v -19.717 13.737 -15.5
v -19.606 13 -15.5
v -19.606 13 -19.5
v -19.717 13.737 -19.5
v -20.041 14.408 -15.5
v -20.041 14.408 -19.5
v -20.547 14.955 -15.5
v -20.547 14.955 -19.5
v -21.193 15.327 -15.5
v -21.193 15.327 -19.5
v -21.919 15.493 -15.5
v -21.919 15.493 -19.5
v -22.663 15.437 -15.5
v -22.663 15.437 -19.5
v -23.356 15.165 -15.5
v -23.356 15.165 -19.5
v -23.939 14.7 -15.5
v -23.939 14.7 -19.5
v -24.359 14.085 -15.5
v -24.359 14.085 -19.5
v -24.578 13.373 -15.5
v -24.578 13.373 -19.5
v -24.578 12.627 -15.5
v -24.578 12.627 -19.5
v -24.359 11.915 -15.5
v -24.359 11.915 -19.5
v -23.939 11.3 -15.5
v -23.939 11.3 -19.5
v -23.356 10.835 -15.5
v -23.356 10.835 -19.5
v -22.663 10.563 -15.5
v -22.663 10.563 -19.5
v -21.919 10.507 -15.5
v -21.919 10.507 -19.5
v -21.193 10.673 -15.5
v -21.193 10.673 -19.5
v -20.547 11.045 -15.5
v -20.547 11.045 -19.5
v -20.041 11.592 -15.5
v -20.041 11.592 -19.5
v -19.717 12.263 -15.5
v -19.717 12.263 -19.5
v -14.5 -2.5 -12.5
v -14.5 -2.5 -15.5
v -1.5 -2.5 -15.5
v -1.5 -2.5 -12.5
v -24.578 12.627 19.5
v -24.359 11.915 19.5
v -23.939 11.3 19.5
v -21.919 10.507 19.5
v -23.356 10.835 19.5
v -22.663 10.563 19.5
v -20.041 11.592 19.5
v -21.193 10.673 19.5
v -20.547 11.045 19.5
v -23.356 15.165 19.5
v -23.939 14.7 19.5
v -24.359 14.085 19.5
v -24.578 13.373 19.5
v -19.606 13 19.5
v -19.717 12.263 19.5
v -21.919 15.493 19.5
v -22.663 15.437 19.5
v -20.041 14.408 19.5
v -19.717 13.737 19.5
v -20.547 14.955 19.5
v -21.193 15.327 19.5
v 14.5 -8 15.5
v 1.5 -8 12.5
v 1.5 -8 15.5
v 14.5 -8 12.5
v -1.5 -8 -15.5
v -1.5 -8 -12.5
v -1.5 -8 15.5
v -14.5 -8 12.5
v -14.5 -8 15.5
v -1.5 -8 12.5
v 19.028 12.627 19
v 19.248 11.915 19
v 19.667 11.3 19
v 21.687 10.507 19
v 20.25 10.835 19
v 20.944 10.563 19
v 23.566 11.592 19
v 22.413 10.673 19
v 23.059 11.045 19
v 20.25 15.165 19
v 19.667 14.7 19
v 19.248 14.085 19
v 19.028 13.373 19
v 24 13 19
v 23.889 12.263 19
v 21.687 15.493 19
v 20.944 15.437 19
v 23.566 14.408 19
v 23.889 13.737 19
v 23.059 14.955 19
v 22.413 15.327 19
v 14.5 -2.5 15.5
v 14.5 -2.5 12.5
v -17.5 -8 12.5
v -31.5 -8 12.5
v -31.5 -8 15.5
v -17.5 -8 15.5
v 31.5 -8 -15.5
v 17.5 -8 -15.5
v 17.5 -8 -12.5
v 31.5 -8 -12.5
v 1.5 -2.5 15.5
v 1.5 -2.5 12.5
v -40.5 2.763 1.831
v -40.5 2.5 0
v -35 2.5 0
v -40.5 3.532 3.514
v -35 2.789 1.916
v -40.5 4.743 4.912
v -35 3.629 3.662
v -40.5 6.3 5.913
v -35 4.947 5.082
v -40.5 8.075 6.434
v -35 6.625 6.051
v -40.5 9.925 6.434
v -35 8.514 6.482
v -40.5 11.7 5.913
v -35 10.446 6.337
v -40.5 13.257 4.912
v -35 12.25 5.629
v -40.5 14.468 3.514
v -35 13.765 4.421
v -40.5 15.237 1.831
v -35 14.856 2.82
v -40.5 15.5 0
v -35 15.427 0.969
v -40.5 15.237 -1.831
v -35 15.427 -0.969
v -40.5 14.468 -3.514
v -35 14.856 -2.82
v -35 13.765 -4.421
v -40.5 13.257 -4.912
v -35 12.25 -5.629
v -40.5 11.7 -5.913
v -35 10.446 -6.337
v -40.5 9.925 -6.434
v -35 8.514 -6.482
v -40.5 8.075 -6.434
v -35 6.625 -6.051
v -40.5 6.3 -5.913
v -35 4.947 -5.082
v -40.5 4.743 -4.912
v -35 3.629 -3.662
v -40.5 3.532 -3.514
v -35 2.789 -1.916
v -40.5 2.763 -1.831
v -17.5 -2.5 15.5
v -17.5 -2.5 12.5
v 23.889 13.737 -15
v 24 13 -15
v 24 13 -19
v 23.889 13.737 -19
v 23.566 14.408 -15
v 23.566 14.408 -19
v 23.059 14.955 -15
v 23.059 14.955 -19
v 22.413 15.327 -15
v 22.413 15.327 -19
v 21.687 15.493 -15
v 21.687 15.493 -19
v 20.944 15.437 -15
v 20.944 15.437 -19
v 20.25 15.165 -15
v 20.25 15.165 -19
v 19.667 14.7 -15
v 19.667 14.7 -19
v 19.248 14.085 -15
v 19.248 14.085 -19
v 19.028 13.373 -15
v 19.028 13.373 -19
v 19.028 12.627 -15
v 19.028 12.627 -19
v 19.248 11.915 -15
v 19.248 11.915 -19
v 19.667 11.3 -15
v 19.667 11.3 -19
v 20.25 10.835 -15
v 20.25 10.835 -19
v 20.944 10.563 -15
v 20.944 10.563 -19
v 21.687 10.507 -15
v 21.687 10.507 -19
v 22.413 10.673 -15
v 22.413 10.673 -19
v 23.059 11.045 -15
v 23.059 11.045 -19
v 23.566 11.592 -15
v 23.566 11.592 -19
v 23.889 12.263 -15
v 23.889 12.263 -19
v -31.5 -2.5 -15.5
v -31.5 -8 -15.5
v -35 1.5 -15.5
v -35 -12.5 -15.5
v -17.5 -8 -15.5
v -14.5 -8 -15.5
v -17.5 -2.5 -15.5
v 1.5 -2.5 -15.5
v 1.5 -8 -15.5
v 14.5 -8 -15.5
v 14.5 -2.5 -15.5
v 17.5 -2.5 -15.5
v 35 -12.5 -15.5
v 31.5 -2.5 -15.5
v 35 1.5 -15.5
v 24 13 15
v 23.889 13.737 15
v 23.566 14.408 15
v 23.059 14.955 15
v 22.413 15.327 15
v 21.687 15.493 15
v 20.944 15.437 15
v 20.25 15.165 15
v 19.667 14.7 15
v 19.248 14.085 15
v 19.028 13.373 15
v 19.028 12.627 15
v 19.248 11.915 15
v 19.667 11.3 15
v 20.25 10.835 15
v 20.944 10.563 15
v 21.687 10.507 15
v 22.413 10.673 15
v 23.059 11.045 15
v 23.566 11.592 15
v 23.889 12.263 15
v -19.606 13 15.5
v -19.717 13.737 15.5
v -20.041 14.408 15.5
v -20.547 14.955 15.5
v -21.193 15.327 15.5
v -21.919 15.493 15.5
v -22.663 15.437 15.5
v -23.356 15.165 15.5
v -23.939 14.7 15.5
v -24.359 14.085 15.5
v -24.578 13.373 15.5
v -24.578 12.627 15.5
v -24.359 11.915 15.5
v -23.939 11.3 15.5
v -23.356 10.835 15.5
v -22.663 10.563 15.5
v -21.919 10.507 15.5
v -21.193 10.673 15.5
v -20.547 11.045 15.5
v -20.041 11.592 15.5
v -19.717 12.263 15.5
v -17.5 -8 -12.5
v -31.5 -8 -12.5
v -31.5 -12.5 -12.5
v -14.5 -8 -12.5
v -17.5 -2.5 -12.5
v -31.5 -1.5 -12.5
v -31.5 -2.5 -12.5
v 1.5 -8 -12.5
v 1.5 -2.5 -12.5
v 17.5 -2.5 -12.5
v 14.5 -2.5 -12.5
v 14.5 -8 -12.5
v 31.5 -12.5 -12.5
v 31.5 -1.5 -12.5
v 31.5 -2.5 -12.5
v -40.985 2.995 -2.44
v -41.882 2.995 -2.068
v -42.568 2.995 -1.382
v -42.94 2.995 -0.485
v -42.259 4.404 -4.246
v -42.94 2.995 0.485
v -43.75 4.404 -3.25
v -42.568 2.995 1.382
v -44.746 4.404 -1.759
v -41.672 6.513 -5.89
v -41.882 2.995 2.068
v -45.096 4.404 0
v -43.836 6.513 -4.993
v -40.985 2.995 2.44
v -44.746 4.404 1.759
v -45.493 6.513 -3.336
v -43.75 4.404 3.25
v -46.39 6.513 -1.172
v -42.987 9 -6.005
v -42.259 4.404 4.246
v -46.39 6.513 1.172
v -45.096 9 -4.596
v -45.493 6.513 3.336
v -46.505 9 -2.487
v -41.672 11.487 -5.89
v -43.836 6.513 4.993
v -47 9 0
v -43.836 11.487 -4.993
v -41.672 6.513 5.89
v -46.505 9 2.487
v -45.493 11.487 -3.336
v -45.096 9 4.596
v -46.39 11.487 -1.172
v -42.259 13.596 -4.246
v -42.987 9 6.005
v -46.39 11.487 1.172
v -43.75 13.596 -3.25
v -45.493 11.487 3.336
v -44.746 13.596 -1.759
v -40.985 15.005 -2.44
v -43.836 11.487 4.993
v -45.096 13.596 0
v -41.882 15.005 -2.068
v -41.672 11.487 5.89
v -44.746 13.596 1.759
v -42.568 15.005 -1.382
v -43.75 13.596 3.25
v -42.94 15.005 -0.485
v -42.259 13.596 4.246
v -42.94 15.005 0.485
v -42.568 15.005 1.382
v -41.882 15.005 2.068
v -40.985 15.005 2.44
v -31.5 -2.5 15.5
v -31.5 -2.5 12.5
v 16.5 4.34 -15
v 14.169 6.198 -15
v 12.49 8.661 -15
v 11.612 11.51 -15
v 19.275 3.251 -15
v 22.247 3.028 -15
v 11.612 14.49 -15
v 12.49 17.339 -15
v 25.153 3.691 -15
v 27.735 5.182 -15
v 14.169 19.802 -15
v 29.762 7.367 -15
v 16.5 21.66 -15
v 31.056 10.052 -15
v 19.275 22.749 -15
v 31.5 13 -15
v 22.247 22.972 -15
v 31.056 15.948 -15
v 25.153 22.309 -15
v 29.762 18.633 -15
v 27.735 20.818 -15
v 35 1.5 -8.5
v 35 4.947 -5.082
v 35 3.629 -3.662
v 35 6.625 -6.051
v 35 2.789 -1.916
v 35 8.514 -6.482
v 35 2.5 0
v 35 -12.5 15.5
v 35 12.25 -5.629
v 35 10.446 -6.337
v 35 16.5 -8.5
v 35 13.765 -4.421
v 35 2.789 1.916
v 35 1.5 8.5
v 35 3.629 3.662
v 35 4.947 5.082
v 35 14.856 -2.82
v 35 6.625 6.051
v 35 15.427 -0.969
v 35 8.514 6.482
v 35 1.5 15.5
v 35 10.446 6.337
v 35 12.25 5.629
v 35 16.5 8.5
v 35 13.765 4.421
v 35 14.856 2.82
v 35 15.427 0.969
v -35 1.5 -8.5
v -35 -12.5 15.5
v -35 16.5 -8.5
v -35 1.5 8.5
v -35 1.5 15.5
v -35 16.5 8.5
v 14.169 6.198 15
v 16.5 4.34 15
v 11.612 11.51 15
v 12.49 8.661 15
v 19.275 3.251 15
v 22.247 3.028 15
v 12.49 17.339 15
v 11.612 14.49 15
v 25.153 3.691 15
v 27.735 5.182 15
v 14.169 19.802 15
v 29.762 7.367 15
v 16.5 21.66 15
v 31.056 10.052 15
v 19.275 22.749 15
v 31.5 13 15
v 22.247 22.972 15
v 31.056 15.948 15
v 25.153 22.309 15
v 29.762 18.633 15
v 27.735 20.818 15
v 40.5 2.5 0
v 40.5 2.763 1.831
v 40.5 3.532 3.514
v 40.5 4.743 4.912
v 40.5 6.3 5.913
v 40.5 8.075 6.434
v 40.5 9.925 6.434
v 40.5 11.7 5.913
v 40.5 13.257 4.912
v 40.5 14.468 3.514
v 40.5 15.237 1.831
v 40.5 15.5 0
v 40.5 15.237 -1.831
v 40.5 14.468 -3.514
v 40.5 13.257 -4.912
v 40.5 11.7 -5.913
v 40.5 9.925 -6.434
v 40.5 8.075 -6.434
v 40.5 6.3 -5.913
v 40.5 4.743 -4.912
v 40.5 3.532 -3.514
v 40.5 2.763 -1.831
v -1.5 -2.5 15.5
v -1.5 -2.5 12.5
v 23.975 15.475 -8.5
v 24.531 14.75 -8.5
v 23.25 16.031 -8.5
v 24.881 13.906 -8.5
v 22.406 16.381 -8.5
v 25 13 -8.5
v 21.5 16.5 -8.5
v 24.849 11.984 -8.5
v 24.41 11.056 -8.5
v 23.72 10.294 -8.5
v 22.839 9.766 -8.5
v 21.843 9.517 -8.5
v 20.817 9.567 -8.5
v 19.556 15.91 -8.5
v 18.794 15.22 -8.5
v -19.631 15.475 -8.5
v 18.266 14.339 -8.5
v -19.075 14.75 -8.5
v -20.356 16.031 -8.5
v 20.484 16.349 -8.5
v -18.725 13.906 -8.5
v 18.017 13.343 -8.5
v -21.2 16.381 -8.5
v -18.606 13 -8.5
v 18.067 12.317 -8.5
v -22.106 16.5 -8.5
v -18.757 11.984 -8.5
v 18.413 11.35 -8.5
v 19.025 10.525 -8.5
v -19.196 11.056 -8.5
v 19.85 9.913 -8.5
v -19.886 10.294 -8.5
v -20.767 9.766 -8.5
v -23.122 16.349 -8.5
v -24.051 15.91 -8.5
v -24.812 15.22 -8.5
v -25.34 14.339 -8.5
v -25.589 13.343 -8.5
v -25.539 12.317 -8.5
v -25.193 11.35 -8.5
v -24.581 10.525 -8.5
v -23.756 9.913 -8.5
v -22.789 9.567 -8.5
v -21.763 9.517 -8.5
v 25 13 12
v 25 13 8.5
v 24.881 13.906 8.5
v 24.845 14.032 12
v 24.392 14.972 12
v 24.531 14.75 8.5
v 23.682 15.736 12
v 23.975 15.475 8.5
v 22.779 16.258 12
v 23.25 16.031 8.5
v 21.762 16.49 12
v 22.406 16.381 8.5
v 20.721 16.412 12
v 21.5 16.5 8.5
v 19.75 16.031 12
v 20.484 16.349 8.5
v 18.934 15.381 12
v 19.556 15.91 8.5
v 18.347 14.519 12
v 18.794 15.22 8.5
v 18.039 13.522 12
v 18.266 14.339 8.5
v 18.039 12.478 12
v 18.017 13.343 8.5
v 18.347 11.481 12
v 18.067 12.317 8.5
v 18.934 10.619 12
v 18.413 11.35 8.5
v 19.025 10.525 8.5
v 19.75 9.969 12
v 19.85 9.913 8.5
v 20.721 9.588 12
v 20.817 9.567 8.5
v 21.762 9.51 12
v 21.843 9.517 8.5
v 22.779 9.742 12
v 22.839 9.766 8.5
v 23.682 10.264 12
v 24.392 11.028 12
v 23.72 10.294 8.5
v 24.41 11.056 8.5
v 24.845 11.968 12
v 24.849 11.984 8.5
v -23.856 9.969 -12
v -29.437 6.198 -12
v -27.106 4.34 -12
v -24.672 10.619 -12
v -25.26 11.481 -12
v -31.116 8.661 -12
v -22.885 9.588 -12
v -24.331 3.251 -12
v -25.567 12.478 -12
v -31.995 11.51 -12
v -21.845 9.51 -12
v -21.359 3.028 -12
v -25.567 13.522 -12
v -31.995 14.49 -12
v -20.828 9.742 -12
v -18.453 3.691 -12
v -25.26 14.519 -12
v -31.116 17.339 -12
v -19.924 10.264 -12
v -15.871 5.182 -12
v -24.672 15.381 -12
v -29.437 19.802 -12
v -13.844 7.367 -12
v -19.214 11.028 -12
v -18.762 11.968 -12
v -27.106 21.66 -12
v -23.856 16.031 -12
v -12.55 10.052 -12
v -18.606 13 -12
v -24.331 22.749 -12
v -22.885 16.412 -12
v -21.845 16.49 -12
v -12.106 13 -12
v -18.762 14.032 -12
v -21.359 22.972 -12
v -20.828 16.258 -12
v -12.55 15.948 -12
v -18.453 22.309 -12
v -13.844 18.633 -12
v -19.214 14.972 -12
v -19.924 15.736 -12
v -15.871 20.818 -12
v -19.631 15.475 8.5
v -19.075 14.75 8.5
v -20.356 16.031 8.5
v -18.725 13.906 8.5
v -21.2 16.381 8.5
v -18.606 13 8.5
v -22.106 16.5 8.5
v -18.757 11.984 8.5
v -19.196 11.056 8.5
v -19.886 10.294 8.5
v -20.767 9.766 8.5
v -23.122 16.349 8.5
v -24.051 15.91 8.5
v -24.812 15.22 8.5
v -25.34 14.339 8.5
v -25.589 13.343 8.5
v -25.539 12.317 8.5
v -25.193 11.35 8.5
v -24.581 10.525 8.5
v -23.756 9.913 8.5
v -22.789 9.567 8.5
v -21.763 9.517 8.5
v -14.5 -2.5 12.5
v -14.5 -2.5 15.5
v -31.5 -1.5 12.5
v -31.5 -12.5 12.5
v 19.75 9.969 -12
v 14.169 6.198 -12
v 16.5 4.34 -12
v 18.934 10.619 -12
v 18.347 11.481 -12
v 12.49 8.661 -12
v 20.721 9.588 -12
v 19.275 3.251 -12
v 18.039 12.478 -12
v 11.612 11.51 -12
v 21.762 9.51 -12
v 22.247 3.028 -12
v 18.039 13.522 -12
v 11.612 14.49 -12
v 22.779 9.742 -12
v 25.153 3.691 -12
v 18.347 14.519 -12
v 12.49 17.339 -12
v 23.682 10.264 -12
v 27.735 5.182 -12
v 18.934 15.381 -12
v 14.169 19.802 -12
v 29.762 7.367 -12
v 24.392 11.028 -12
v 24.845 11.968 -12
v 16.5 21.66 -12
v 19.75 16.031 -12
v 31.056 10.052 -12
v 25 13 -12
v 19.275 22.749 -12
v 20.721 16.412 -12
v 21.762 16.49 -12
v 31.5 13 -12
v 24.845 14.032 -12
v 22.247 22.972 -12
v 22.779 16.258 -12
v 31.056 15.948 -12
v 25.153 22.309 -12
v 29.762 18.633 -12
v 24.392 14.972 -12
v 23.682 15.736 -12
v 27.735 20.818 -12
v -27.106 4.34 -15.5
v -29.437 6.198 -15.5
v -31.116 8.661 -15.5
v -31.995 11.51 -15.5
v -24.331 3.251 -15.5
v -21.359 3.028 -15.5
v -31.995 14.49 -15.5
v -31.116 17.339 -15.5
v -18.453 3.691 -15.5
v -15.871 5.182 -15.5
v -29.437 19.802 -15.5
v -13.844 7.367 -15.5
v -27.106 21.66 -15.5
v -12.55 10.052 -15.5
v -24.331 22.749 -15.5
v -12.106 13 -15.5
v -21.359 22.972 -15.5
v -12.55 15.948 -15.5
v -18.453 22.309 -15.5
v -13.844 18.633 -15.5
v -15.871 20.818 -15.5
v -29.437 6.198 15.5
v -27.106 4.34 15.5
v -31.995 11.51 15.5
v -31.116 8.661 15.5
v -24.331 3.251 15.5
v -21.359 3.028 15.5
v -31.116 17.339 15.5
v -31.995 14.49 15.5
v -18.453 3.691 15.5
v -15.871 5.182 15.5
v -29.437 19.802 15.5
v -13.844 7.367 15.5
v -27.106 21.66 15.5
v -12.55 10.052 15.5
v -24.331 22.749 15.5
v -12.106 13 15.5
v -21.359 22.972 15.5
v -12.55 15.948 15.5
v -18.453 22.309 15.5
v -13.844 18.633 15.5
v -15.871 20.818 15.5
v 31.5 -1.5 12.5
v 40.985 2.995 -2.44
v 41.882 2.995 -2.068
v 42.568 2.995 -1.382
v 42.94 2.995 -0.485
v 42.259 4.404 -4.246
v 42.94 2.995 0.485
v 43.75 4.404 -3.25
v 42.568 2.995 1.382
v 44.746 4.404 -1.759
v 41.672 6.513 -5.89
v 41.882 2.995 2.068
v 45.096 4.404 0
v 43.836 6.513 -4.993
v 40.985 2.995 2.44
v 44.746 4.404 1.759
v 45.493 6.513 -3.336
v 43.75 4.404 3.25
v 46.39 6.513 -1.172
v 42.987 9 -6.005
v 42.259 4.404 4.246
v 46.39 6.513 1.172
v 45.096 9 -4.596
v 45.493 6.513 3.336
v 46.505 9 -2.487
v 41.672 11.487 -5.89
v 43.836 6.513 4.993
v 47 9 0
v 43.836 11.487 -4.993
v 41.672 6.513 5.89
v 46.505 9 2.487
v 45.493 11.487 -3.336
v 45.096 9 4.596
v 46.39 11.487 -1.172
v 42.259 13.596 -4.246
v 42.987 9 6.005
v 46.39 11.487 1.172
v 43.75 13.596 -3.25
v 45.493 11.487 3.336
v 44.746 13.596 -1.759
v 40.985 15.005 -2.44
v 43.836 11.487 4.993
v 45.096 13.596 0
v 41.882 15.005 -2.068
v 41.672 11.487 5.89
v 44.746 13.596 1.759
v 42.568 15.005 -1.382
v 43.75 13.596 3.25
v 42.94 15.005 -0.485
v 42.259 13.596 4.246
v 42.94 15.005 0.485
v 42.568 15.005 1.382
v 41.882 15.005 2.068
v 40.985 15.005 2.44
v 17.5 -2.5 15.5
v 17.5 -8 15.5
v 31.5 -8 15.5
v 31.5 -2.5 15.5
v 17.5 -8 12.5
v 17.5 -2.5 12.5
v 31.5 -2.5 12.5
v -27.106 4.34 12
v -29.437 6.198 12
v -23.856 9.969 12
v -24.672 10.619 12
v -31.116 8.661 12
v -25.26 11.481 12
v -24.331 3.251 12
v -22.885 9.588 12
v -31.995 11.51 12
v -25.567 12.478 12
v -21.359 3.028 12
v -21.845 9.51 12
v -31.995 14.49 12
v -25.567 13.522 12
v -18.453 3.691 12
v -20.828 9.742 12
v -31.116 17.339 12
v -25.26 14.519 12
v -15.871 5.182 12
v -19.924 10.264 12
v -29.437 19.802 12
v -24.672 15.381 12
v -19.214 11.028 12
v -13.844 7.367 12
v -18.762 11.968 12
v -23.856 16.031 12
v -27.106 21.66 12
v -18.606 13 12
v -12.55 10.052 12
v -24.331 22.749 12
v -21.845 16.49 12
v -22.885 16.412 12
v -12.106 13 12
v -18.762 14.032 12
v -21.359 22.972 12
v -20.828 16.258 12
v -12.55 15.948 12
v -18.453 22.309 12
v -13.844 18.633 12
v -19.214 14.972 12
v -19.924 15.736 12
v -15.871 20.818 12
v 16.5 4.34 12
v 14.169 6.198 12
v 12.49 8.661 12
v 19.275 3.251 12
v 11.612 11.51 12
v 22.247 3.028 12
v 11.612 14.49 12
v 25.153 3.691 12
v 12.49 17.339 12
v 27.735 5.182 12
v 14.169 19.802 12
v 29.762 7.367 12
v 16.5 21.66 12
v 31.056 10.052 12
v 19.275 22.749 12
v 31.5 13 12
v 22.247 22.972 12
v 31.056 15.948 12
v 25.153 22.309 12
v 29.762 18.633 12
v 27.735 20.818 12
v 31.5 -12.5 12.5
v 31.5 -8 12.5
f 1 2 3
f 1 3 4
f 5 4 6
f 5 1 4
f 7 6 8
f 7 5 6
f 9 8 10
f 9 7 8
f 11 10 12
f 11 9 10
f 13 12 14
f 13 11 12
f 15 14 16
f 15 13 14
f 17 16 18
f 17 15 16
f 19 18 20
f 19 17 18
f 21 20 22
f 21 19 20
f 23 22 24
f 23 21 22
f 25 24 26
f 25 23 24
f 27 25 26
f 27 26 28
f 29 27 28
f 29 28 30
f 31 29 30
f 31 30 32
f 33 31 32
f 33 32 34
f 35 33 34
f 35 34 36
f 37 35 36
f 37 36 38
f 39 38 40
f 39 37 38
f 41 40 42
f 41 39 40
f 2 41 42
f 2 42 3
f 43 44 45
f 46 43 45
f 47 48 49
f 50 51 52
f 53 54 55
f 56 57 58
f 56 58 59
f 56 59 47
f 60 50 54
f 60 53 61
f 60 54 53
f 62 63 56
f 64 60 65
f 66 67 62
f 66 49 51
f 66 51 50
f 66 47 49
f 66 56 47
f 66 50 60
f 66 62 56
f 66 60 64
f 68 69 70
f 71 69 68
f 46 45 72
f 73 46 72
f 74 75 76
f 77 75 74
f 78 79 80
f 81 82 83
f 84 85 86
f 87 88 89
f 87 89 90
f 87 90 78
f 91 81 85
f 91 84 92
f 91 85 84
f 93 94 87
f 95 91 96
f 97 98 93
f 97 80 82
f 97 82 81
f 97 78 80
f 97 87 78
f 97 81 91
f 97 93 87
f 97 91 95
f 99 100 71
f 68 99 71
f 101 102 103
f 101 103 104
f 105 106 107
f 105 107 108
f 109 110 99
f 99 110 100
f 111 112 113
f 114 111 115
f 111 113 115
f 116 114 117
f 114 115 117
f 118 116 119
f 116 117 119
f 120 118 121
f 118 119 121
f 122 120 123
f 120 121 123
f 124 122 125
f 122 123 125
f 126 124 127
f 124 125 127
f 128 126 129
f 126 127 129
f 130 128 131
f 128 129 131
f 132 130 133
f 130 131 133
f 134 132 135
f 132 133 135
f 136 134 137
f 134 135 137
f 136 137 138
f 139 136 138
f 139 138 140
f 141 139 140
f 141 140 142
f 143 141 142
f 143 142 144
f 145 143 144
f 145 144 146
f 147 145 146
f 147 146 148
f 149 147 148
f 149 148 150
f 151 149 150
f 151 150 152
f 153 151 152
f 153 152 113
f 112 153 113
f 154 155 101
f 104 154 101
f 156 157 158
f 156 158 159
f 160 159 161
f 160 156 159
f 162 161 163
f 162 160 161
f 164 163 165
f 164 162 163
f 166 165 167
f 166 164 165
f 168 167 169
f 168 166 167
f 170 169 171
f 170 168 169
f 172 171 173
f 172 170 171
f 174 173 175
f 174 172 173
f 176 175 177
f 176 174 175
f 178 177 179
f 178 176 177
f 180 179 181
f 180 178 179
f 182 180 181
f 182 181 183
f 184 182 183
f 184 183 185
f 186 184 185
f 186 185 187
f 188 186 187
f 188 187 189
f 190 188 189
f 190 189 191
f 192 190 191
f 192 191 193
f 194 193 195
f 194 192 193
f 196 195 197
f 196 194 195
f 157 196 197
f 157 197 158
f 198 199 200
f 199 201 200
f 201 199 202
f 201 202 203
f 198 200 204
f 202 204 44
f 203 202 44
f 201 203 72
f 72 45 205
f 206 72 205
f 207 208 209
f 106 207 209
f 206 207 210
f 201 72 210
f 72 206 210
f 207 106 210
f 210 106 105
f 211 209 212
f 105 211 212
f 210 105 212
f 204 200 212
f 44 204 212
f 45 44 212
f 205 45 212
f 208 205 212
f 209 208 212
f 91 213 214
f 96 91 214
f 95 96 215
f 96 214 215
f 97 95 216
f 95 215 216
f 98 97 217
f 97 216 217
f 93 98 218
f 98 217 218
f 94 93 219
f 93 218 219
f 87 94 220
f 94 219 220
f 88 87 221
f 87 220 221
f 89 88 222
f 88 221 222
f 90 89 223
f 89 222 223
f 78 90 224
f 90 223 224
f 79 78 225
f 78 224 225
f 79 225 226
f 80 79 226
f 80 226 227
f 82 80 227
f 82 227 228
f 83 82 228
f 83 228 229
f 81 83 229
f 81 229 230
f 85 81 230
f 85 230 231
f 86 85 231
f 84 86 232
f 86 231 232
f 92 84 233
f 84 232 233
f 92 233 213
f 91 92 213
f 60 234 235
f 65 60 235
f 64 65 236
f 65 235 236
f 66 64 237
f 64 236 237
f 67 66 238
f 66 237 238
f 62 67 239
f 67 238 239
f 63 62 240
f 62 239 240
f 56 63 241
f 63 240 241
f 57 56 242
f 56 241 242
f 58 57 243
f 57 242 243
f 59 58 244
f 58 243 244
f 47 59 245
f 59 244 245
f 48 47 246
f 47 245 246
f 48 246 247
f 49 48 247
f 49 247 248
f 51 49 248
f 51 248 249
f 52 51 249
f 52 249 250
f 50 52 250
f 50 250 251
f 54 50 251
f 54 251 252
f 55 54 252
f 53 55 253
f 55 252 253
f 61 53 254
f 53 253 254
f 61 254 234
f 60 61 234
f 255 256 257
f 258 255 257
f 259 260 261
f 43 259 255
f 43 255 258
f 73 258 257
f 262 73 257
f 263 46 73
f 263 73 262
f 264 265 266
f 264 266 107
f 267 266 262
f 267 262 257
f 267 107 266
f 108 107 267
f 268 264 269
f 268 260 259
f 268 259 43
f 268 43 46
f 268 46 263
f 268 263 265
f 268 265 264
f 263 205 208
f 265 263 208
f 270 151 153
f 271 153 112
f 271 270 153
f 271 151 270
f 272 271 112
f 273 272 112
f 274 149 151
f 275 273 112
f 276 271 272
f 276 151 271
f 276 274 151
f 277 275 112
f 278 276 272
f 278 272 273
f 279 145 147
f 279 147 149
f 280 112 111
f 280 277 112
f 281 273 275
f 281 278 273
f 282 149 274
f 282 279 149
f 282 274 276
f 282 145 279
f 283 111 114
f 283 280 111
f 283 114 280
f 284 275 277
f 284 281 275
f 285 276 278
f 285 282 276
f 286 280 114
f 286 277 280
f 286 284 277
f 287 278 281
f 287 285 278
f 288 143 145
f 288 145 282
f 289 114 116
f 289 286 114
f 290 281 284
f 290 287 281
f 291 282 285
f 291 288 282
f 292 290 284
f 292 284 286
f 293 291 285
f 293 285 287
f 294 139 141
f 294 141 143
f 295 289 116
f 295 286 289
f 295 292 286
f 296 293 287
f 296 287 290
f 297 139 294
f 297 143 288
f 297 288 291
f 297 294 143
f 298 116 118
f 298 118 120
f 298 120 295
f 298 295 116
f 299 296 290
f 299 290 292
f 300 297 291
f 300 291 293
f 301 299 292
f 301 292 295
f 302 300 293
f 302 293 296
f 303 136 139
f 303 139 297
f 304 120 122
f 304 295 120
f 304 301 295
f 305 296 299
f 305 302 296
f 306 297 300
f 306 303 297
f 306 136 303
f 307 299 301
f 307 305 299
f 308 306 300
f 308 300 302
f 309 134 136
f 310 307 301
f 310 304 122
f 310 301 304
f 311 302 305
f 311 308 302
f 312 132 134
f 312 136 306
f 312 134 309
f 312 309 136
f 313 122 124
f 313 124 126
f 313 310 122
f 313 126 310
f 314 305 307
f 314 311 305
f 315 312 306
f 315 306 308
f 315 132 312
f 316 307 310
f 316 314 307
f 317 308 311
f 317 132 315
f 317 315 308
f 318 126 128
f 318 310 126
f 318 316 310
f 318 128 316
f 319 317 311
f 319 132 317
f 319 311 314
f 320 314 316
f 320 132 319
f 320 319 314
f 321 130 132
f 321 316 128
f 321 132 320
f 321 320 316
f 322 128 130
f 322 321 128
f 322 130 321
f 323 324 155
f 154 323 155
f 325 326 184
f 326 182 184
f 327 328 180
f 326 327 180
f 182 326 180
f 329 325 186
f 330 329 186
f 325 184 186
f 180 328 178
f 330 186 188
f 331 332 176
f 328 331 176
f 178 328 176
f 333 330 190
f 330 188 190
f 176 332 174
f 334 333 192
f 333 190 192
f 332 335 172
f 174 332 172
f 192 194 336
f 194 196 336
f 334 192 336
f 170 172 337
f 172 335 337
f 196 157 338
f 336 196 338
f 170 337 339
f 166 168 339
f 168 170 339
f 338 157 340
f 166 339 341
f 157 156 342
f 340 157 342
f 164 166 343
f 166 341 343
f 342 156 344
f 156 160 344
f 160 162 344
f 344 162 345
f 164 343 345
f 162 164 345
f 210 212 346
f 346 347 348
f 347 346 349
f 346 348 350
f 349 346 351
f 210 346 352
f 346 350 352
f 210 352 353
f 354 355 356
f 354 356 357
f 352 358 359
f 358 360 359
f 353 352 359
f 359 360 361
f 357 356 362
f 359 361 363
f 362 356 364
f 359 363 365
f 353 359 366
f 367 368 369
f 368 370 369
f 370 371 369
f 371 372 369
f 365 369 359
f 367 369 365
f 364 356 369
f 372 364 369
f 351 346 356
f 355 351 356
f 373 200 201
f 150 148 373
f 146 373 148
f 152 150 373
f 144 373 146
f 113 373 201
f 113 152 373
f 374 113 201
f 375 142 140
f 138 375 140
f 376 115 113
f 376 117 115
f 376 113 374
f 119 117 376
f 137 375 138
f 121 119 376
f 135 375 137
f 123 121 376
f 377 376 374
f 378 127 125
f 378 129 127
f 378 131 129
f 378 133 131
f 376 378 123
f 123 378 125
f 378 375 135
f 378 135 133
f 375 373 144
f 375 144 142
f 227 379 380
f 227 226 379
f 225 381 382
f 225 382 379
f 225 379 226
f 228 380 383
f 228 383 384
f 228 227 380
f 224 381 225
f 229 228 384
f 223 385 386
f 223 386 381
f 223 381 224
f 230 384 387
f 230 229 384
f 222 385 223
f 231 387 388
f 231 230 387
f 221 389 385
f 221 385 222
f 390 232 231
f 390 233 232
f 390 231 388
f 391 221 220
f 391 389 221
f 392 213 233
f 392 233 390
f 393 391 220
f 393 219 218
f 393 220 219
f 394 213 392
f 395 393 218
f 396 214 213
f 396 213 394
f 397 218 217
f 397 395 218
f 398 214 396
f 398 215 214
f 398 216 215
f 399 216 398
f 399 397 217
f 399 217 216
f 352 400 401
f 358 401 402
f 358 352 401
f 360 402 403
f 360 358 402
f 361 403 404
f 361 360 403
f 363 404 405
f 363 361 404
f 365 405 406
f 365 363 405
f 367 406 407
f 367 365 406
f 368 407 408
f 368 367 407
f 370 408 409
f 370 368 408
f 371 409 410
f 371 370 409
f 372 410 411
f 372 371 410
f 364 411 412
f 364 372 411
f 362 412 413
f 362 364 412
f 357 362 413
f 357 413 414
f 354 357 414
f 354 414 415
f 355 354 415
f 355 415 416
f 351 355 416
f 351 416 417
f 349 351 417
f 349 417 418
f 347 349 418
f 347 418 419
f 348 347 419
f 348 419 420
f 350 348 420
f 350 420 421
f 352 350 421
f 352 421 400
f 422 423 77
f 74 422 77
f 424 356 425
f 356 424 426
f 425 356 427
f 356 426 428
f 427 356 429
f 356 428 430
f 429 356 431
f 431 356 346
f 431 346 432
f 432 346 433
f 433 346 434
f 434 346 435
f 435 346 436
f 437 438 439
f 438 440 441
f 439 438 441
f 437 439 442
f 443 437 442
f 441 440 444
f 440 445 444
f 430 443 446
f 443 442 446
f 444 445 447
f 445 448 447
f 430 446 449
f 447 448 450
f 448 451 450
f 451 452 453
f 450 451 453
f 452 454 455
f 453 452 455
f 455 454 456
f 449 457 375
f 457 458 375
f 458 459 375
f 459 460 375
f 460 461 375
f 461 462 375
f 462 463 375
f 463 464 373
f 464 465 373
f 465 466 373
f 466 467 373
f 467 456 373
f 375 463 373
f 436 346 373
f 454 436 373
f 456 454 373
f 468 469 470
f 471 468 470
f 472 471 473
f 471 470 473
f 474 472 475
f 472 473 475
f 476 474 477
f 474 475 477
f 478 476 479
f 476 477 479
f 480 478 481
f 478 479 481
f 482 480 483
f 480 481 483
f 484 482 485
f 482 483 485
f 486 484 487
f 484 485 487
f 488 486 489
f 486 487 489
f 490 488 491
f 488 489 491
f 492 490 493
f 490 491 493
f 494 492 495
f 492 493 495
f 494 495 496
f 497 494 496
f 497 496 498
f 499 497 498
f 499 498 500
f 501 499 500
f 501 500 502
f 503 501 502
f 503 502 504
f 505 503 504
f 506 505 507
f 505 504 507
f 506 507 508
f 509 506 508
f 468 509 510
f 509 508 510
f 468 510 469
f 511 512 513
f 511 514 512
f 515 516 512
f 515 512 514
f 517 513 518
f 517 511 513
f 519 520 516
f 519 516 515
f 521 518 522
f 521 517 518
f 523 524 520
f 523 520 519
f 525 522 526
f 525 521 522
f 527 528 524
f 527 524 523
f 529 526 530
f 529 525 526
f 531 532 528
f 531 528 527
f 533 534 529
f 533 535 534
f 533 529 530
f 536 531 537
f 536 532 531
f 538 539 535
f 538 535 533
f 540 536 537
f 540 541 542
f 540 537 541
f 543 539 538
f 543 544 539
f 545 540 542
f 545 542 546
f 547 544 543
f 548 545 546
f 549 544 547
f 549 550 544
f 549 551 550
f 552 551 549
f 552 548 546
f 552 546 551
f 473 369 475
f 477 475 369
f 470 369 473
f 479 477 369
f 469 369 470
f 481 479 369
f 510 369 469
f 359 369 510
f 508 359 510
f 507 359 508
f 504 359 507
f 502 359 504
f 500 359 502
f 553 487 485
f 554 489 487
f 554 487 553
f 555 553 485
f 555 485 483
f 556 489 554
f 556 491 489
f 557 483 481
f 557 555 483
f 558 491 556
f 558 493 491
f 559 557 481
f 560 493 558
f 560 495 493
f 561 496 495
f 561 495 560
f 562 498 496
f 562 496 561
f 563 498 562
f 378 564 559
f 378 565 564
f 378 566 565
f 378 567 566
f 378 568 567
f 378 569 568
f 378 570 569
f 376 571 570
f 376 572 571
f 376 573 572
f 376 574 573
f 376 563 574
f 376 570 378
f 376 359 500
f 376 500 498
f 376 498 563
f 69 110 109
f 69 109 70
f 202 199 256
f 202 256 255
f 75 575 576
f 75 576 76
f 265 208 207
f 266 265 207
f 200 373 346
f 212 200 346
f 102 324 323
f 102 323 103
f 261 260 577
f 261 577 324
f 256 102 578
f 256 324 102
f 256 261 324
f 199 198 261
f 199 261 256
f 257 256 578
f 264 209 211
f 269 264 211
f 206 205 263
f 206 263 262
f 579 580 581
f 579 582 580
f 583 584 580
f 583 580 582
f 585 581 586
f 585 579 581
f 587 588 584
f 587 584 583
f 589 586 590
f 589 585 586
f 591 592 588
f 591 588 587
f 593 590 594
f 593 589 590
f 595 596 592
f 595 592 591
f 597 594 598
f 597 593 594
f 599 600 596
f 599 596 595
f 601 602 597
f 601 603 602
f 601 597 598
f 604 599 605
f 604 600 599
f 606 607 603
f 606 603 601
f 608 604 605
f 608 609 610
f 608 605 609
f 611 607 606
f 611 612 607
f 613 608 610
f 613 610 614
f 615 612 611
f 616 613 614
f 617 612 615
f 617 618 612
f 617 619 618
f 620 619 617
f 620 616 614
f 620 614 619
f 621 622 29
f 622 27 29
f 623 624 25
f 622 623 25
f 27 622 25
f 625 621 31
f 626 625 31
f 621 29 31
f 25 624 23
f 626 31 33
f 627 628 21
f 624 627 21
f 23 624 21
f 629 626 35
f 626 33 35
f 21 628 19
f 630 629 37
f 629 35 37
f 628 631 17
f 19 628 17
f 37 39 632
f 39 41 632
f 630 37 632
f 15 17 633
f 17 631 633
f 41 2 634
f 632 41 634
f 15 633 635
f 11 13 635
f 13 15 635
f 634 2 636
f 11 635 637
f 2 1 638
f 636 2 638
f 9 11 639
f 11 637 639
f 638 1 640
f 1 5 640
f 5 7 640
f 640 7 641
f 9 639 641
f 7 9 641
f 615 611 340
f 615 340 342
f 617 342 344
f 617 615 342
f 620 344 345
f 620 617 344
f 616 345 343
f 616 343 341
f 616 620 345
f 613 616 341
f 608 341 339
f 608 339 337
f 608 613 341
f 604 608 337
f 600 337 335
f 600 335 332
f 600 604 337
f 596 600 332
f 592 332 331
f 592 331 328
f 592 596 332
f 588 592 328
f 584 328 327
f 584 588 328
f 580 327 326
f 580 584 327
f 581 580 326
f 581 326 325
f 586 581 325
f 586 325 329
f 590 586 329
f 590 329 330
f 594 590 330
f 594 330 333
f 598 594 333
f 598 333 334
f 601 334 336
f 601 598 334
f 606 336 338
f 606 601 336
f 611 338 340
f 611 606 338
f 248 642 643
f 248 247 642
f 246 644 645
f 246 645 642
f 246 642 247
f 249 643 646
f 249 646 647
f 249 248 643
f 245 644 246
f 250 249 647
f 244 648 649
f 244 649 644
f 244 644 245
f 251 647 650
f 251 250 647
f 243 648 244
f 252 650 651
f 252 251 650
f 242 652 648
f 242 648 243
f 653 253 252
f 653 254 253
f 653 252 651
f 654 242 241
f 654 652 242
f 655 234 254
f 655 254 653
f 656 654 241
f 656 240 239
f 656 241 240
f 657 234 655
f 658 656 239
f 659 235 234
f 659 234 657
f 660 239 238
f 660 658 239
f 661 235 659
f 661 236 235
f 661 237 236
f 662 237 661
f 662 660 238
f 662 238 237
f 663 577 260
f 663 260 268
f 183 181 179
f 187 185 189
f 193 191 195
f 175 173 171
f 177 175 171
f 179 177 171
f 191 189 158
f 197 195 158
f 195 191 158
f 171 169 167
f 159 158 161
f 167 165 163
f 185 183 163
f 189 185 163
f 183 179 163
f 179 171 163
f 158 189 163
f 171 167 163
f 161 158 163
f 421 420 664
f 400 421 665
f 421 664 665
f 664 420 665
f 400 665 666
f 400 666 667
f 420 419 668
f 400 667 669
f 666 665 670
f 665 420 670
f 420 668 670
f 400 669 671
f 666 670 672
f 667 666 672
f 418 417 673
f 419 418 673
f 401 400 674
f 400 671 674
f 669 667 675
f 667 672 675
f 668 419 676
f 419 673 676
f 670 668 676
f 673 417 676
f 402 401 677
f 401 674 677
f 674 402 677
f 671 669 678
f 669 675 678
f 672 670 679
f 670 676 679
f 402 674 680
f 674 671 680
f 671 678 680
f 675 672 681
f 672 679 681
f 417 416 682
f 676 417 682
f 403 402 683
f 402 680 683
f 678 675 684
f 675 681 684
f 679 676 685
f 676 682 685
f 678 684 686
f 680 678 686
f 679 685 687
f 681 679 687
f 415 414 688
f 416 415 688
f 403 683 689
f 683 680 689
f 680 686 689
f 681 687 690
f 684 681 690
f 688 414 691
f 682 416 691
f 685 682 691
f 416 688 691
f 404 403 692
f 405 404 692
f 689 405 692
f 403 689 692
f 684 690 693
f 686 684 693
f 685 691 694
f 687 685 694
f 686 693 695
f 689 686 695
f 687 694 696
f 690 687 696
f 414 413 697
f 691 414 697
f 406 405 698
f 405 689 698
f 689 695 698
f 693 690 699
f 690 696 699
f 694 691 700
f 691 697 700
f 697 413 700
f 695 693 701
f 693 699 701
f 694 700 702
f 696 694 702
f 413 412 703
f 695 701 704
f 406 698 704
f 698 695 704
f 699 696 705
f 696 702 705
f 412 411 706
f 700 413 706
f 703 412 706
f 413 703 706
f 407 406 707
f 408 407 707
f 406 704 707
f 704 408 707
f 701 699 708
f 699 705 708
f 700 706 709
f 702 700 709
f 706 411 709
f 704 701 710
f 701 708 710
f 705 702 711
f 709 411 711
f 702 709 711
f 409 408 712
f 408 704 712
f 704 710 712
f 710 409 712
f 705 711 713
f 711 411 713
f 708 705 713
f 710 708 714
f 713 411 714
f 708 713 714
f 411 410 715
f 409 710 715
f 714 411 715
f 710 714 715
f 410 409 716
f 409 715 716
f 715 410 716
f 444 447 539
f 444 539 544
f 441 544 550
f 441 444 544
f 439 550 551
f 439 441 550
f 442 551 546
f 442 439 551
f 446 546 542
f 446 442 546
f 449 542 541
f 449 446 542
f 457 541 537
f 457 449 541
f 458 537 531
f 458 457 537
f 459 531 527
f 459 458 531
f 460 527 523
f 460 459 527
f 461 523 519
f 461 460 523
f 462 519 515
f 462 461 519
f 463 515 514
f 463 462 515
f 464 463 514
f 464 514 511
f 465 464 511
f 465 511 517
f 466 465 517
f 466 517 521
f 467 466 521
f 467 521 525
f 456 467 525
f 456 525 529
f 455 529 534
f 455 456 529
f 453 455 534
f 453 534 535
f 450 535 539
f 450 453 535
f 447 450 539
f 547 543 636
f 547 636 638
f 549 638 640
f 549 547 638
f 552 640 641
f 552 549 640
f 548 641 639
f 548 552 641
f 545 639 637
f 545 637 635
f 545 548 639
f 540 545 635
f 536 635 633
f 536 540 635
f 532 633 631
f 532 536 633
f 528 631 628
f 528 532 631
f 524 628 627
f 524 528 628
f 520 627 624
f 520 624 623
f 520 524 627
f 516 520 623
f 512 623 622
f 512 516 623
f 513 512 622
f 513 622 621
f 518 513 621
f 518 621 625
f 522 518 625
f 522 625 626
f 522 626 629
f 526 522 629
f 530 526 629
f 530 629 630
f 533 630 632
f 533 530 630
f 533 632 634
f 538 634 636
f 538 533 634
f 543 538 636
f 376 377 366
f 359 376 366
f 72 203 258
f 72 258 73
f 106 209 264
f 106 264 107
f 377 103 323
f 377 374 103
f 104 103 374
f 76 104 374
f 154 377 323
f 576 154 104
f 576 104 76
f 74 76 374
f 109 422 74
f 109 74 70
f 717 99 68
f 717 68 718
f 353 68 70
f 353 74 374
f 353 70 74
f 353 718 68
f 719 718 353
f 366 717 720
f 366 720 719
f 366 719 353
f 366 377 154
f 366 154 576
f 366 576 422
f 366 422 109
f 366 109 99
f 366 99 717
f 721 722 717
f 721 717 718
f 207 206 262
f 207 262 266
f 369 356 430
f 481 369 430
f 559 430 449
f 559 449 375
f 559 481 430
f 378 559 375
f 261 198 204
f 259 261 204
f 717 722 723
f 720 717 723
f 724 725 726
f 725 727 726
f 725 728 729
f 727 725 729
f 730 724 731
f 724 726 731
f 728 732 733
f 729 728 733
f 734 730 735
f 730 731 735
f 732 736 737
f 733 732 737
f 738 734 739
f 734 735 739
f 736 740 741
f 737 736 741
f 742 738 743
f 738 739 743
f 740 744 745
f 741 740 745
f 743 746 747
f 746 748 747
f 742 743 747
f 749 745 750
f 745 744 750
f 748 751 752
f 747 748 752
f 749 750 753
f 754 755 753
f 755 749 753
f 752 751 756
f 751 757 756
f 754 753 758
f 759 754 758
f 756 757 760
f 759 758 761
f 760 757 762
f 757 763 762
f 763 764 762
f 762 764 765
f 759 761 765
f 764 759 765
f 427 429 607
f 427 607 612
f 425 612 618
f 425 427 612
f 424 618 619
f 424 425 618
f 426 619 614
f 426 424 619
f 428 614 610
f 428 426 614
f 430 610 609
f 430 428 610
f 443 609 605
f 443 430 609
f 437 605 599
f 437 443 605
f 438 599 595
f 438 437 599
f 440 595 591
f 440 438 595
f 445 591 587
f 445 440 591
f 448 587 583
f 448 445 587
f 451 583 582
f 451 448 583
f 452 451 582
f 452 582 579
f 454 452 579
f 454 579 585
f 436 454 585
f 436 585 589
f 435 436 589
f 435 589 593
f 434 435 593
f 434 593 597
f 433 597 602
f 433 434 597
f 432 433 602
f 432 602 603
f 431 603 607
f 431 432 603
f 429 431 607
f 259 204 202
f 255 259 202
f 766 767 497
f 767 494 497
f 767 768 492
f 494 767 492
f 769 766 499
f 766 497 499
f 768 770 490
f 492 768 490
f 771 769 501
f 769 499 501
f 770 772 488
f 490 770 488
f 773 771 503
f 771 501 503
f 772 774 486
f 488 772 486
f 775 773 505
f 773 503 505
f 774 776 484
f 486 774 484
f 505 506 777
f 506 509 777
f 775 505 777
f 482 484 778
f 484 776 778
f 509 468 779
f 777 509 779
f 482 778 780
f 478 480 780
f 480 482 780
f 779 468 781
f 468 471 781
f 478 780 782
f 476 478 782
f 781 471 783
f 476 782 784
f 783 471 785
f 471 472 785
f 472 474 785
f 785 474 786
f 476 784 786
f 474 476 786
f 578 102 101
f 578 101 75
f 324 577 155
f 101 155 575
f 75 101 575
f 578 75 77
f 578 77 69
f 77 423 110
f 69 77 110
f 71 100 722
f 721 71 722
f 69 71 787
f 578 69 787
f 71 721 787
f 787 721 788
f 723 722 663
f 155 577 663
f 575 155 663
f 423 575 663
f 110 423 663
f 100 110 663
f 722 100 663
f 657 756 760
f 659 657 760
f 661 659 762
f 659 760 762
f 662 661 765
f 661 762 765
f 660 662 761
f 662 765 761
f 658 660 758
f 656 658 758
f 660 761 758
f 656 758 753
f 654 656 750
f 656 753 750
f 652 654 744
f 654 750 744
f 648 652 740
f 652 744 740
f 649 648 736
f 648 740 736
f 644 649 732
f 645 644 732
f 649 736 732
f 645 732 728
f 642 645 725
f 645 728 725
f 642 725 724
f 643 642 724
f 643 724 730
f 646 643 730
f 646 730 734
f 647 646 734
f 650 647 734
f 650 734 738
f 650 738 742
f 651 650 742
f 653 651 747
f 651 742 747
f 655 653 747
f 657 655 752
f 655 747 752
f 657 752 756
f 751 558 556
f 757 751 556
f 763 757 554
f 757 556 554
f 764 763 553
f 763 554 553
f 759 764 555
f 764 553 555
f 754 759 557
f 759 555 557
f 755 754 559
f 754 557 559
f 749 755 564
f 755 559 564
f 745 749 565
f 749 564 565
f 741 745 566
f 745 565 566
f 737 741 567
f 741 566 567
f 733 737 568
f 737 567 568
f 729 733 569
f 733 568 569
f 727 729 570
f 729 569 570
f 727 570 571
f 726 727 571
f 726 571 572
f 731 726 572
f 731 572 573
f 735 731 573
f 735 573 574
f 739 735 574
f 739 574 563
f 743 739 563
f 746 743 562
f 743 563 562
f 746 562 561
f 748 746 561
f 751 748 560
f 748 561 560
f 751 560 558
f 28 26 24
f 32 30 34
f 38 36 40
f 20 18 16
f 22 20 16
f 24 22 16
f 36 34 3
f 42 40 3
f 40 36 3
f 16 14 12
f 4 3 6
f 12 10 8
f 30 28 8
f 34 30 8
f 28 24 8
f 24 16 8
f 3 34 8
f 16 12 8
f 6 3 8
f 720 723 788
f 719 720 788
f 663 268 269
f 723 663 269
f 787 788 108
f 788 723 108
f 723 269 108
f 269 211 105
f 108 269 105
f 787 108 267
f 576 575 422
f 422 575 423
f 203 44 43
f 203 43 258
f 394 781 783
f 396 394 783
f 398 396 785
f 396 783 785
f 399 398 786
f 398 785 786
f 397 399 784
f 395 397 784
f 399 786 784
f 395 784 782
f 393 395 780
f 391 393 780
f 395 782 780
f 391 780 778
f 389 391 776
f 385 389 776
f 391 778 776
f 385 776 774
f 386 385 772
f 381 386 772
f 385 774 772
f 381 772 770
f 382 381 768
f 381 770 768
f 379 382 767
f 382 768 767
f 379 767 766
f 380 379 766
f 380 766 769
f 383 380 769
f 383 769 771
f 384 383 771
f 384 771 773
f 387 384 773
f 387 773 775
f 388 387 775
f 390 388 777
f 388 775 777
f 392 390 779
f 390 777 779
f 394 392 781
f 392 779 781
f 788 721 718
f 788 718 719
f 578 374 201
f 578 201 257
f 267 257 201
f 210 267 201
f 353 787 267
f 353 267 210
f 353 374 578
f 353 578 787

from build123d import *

# Parameters (mm, degrees)
F0_W      = 70
F0_H      = 31
F1_DEPTH  = 1.5
F2_W      = 70
F2_H      = 3
F3_DEPTH  = 11
F4_W      = 70
F4_H      = 3
F5_DEPTH  = 11
F6_W      = 3.5
F6_H      = 25
F7_DEPTH  = 11
F8_W      = 3.5
F8_H      = 25
F9_DEPTH  = 11
F10_W     = 70
F10_H     = 17
F11_DEPTH = 15
F12_W     = 14
F12_H     = 5.5
F13_DEPTH = 70
F14_W     = 13
F14_H     = 5.5
F15_DEPTH = 70
F16_W     = 13
F16_H     = 5.5
F17_DEPTH = 70
F18_W     = 14
F18_H     = 5.5
F19_DEPTH = 70
F21_R     = 3.5
F22_DEPTH = 3.5
F23_R     = 3.5
F24_DEPTH = 3.5
F25_R     = 10
F26_DEPTH = 3
F27_R     = 10
F28_DEPTH = 3.5
F29_R     = 2.5
F30_DEPTH = 4
F31_R     = 2.5
F32_DEPTH = 4
F33_R     = 6.5
F34_DEPTH = 5.5


# Not quite as in the source:
# - a pattern or mirror of a feature is missing from the dataset's text; its kind, count and spacing are read off the source's solid


with BuildPart() as f1:
    # F0 (on Front) → F1 (new body, symmetric)
    with BuildSketch(Plane.XZ):
        Rectangle(F0_W, F0_H)
    extrude(amount=F1_DEPTH, both=True)

    # F2 (on face) → F3 (join)
    with BuildSketch(Plane.XZ.offset(1.5)):
        with Locations((0, -14)):
            Rectangle(F2_W, F2_H)
    extrude(amount=F3_DEPTH)

    # F4 (on face) → F5 (join)
    with BuildSketch(Plane.XZ.offset(1.5)):
        with Locations((0, 14)):
            Rectangle(F4_W, F4_H)
    extrude(amount=F5_DEPTH)

    # F6 (on face) → F7 (join)
    with BuildSketch(Plane.XZ.offset(1.5)):
        with Locations((33.25, 0)):
            Rectangle(F6_W, F6_H)
    extrude(amount=F7_DEPTH)

    # F8 (on face) → F9 (join)
    with BuildSketch(Plane.XZ.offset(1.5)):
        with Locations((-33.25, 0)):
            Rectangle(F8_W, F8_H)
    extrude(amount=F9_DEPTH)

    # F10 (on face) → F11 (join)
    with BuildSketch(Plane(origin=(0, 1.5, 0), x_dir=(-1, 0, 0), z_dir=(0, 1, 0))):
        Rectangle(F10_W, F10_H)
    extrude(amount=F11_DEPTH)

    # F12 (on face) → F13 (cut)
    with BuildSketch(Plane(origin=(0, 0, -15.5), x_dir=(1, 0, 0), z_dir=(0, 0, -1))):
        with Locations((24.5, 5.25)):
            Rectangle(F12_W, F12_H)
    extrude(amount=-F13_DEPTH, mode=Mode.SUBTRACT)

    # F14 (on face) → F15 (cut)
    with BuildSketch(Plane(origin=(0, 0, -15.5), x_dir=(1, 0, 0), z_dir=(0, 0, -1))):
        with Locations((8, 5.25)):
            Rectangle(F14_W, F14_H)
    extrude(amount=-F15_DEPTH, mode=Mode.SUBTRACT)

    # F16 (on face) → F17 (cut)
    with BuildSketch(Plane(origin=(0, 0, -15.5), x_dir=(1, 0, 0), z_dir=(0, 0, -1))):
        with Locations((-8, 5.25)):
            Rectangle(F16_W, F16_H)
    extrude(amount=-F17_DEPTH, mode=Mode.SUBTRACT)

    # F18 (on face) → F19 (cut)
    with BuildSketch(Plane(origin=(0, 0, -15.5), x_dir=(1, 0, 0), z_dir=(0, 0, -1))):
        with Locations((-24.5, 5.25)):
            Rectangle(F18_W, F18_H)
    extrude(amount=-F19_DEPTH, mode=Mode.SUBTRACT)

    # F21 (on face) → F22 (join)
    with BuildSketch(Plane.XY.offset(8.5)):
        with Locations((21.5, 13)):
            Circle(F21_R)
    f22 = extrude(amount=F22_DEPTH)

    # F22_copies: F22 across plane
    add(f22.mirror(Plane(origin=(0, 0, 0), x_dir=(-1, 0, 0), z_dir=(0, 0, -1))))

    # F23 (on face) → F24 (join)
    with BuildSketch(Plane.XY.offset(8.5)):
        with Locations((-22.1062030418, 13)):
            Circle(F23_R)
    f24 = extrude(amount=F24_DEPTH)

    # F24_copies: F24 across plane
    add(f24.mirror(Plane(origin=(0, 0, 0), x_dir=(-1, 0, 0), z_dir=(0, 0, -1))))

    # F25 (on face) → F26 (join)
    with BuildSketch(Plane.XY.offset(12)):
        with Locations((21.5, 13)):
            Circle(F25_R)
    f26 = extrude(amount=F26_DEPTH)

    # F26_copies: F26 across plane
    add(f26.mirror(Plane(origin=(0, 0, 0), x_dir=(-1, 0, 0), z_dir=(0, 0, -1))))

    # F27 (on face) → F28 (join)
    with BuildSketch(Plane.XY.offset(12)):
        with Locations((-22.1062030418, 13)):
            Circle(F27_R)
    f28 = extrude(amount=F28_DEPTH)

    # F28_copies: F28 across plane
    add(f28.mirror(Plane(origin=(0, 0, 0), x_dir=(-1, 0, 0), z_dir=(0, 0, -1))))

    # F29 (on face) → F30 (join)
    with BuildSketch(Plane.XY.offset(15.5)):
        with Locations((-22.1062030418, 13)):
            Circle(F29_R)
    f30 = extrude(amount=F30_DEPTH)

    # F30_copies: F30 across plane
    add(f30.mirror(Plane(origin=(0, 0, 0), x_dir=(-1, 0, 0), z_dir=(0, 0, -1))))

    # F31 (on face) → F32 (join)
    with BuildSketch(Plane.XY.offset(15)):
        with Locations((21.5, 13)):
            Circle(F31_R)
    f32 = extrude(amount=F32_DEPTH)

    # F32_copies: F32 across plane
    add(f32.mirror(Plane(origin=(0, 0, 0), x_dir=(-1, 0, 0), z_dir=(0, 0, -1))))

    # F33 (on face) → F34 (join)
    with BuildSketch(Plane(origin=(-35, 0, 0), x_dir=(0, -1, 0), z_dir=(-1, 0, 0))):
        with Locations((-9, 0)):
            Circle(F33_R)
    f34 = extrude(amount=F34_DEPTH)

    # F34_copies: F34 across plane
    add(f34.mirror(Plane(origin=(0, 0, 0), x_dir=(0, 0, 1), z_dir=(1, 0, 0))))

    # F35 (on face) → F36 (revolve)
    with BuildSketch(Plane(origin=(-40.5, 0, 0), x_dir=(0, -1, 0), z_dir=(-1, 0, 0))):
        with BuildLine():
            Line((-15.5, 0), (-9, 0))
            Line((-9, 0), (-2.5, 0))
            ThreePointArc((-2.5, 0), (-9, 6.5), (-15.5, 0))
        make_face()
    f36 = revolve(axis=Axis((-40.5, 9, 0), (0, 1, 0)))

    # F36_copies: F36 across plane
    add(f36.mirror(Plane(origin=(0, 0, 0), x_dir=(0, 0, 1), z_dir=(1, 0, 0))))


solid = f1.part
